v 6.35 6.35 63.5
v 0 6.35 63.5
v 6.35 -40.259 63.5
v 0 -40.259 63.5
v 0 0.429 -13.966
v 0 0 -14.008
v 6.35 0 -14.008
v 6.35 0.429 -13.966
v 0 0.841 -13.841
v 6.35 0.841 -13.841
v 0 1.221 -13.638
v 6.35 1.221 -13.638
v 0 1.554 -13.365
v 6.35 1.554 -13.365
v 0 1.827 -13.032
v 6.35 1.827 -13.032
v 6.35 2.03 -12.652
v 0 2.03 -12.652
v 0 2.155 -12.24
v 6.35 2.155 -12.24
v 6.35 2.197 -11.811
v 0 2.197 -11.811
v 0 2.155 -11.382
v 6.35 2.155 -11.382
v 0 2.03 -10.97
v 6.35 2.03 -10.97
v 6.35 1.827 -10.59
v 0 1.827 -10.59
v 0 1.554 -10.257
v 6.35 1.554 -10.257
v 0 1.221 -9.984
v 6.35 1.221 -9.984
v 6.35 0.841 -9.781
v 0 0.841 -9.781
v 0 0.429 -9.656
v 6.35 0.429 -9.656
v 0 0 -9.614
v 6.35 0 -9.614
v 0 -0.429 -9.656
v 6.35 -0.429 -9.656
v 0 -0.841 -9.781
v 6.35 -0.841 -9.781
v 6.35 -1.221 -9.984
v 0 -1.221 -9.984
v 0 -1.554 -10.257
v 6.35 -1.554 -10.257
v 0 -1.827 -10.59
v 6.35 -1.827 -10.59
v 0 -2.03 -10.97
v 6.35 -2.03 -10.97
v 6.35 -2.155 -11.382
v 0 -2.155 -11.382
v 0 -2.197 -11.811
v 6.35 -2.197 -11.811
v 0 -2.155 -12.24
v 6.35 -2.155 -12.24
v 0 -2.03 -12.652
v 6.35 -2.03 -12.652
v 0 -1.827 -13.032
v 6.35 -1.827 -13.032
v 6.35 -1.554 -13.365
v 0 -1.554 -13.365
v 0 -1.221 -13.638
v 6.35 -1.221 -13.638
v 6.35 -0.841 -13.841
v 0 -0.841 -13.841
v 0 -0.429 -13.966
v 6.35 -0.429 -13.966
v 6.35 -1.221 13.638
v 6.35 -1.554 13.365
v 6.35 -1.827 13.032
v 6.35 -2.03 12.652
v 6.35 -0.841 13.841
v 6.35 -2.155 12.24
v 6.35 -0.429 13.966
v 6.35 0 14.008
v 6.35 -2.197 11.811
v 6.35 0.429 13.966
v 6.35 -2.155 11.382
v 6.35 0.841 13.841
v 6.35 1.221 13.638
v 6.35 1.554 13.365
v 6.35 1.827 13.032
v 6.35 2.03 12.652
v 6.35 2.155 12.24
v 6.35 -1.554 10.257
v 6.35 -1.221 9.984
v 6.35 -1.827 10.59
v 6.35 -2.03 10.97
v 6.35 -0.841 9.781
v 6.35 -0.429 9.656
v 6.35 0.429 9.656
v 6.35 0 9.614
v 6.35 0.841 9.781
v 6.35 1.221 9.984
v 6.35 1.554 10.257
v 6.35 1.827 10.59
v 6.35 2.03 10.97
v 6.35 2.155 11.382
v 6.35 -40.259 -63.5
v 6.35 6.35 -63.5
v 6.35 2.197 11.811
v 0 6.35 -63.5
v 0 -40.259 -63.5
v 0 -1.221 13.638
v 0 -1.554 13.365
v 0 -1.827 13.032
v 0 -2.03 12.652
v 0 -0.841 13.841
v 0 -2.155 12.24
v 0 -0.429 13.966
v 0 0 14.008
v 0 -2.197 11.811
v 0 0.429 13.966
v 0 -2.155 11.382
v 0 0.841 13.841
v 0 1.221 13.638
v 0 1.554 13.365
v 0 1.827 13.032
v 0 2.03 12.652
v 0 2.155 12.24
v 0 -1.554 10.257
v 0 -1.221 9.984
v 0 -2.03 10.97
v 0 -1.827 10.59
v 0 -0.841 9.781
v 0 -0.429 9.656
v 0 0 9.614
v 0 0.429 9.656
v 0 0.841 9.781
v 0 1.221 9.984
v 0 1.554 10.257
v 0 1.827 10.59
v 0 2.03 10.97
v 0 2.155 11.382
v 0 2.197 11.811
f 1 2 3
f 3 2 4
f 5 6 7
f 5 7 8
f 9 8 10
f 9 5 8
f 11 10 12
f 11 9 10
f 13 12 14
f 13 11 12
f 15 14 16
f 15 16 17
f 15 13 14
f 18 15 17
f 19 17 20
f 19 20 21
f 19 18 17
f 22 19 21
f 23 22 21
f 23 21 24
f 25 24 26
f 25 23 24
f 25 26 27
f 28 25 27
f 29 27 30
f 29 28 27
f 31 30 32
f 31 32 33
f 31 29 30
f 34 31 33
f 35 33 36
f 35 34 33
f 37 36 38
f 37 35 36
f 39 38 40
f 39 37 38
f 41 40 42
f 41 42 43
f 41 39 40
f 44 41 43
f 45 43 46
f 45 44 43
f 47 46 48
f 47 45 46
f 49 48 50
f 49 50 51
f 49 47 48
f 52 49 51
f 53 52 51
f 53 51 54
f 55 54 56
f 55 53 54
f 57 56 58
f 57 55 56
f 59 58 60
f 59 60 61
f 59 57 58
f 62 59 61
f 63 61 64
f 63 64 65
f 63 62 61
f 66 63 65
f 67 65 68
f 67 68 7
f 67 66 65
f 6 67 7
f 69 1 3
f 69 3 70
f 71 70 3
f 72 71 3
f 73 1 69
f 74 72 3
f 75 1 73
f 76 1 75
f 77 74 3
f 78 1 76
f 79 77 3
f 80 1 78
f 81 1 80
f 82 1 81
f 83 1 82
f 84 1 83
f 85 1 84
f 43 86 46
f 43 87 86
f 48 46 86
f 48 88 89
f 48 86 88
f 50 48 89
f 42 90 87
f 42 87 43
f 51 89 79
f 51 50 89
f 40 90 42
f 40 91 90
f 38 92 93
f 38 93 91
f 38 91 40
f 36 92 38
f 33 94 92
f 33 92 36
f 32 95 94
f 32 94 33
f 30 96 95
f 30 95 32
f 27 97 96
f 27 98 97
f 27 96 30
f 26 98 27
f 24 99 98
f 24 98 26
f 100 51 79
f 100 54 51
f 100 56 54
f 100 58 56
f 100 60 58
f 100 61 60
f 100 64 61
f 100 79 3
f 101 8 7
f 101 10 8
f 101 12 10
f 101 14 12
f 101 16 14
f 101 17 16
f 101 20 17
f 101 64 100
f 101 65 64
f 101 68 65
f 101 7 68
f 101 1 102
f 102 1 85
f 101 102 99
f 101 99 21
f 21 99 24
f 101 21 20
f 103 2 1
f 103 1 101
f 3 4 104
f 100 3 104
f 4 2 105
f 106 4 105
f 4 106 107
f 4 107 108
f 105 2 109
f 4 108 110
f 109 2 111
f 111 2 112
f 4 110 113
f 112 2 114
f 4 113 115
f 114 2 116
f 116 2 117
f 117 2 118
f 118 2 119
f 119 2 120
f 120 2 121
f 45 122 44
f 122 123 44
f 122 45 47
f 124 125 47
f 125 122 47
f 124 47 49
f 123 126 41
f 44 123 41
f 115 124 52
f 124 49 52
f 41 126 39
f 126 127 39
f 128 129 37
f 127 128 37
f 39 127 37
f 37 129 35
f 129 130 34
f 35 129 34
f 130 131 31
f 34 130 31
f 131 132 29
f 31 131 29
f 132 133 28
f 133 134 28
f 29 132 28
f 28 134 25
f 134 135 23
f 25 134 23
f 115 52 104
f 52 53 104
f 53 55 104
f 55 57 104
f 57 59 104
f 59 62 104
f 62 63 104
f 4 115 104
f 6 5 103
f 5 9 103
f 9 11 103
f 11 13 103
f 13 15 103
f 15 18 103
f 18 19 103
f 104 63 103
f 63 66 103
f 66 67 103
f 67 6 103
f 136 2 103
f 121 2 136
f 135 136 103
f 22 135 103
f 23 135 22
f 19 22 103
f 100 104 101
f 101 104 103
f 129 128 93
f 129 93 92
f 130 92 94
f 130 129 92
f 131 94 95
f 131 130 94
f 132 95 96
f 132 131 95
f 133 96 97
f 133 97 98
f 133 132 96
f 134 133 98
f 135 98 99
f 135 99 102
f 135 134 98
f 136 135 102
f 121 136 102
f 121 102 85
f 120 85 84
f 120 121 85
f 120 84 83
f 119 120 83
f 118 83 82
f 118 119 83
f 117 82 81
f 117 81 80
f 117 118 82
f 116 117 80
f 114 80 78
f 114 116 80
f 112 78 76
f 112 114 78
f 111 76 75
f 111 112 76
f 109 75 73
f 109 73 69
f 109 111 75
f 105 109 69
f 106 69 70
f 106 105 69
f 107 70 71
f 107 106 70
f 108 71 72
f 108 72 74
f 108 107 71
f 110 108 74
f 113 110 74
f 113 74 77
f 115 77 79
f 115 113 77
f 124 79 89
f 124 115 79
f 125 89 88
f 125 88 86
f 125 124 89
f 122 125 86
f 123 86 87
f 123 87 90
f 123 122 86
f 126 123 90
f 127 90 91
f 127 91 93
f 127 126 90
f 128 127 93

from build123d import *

# Parameters (mm, degrees)
SKETCH1_W           = 127
SKETCH1_H           = 12.7
SKETCH1_R           = 2.1971
SKETCH1_H_2         = 33.909
BOSS_EXTRUDE1_DEPTH = 6.35


with BuildPart() as part:
    # Sketch1 → Boss-Extrude1 (new body)
    with BuildSketch(Plane(origin=(0, 0, 0), x_dir=(0, 0, -1), z_dir=(1, 0, 0))):
        Rectangle(SKETCH1_W, SKETCH1_H)
        with Locations((11.811, 0)):
            Circle(SKETCH1_R, mode=Mode.SUBTRACT)
        with Locations((-11.811, 0)):
            Circle(SKETCH1_R, mode=Mode.SUBTRACT)
        with Locations((0, -23.3045)):
            Rectangle(SKETCH1_W, SKETCH1_H_2)
    extrude(amount=BOSS_EXTRUDE1_DEPTH)


solid = part.part
